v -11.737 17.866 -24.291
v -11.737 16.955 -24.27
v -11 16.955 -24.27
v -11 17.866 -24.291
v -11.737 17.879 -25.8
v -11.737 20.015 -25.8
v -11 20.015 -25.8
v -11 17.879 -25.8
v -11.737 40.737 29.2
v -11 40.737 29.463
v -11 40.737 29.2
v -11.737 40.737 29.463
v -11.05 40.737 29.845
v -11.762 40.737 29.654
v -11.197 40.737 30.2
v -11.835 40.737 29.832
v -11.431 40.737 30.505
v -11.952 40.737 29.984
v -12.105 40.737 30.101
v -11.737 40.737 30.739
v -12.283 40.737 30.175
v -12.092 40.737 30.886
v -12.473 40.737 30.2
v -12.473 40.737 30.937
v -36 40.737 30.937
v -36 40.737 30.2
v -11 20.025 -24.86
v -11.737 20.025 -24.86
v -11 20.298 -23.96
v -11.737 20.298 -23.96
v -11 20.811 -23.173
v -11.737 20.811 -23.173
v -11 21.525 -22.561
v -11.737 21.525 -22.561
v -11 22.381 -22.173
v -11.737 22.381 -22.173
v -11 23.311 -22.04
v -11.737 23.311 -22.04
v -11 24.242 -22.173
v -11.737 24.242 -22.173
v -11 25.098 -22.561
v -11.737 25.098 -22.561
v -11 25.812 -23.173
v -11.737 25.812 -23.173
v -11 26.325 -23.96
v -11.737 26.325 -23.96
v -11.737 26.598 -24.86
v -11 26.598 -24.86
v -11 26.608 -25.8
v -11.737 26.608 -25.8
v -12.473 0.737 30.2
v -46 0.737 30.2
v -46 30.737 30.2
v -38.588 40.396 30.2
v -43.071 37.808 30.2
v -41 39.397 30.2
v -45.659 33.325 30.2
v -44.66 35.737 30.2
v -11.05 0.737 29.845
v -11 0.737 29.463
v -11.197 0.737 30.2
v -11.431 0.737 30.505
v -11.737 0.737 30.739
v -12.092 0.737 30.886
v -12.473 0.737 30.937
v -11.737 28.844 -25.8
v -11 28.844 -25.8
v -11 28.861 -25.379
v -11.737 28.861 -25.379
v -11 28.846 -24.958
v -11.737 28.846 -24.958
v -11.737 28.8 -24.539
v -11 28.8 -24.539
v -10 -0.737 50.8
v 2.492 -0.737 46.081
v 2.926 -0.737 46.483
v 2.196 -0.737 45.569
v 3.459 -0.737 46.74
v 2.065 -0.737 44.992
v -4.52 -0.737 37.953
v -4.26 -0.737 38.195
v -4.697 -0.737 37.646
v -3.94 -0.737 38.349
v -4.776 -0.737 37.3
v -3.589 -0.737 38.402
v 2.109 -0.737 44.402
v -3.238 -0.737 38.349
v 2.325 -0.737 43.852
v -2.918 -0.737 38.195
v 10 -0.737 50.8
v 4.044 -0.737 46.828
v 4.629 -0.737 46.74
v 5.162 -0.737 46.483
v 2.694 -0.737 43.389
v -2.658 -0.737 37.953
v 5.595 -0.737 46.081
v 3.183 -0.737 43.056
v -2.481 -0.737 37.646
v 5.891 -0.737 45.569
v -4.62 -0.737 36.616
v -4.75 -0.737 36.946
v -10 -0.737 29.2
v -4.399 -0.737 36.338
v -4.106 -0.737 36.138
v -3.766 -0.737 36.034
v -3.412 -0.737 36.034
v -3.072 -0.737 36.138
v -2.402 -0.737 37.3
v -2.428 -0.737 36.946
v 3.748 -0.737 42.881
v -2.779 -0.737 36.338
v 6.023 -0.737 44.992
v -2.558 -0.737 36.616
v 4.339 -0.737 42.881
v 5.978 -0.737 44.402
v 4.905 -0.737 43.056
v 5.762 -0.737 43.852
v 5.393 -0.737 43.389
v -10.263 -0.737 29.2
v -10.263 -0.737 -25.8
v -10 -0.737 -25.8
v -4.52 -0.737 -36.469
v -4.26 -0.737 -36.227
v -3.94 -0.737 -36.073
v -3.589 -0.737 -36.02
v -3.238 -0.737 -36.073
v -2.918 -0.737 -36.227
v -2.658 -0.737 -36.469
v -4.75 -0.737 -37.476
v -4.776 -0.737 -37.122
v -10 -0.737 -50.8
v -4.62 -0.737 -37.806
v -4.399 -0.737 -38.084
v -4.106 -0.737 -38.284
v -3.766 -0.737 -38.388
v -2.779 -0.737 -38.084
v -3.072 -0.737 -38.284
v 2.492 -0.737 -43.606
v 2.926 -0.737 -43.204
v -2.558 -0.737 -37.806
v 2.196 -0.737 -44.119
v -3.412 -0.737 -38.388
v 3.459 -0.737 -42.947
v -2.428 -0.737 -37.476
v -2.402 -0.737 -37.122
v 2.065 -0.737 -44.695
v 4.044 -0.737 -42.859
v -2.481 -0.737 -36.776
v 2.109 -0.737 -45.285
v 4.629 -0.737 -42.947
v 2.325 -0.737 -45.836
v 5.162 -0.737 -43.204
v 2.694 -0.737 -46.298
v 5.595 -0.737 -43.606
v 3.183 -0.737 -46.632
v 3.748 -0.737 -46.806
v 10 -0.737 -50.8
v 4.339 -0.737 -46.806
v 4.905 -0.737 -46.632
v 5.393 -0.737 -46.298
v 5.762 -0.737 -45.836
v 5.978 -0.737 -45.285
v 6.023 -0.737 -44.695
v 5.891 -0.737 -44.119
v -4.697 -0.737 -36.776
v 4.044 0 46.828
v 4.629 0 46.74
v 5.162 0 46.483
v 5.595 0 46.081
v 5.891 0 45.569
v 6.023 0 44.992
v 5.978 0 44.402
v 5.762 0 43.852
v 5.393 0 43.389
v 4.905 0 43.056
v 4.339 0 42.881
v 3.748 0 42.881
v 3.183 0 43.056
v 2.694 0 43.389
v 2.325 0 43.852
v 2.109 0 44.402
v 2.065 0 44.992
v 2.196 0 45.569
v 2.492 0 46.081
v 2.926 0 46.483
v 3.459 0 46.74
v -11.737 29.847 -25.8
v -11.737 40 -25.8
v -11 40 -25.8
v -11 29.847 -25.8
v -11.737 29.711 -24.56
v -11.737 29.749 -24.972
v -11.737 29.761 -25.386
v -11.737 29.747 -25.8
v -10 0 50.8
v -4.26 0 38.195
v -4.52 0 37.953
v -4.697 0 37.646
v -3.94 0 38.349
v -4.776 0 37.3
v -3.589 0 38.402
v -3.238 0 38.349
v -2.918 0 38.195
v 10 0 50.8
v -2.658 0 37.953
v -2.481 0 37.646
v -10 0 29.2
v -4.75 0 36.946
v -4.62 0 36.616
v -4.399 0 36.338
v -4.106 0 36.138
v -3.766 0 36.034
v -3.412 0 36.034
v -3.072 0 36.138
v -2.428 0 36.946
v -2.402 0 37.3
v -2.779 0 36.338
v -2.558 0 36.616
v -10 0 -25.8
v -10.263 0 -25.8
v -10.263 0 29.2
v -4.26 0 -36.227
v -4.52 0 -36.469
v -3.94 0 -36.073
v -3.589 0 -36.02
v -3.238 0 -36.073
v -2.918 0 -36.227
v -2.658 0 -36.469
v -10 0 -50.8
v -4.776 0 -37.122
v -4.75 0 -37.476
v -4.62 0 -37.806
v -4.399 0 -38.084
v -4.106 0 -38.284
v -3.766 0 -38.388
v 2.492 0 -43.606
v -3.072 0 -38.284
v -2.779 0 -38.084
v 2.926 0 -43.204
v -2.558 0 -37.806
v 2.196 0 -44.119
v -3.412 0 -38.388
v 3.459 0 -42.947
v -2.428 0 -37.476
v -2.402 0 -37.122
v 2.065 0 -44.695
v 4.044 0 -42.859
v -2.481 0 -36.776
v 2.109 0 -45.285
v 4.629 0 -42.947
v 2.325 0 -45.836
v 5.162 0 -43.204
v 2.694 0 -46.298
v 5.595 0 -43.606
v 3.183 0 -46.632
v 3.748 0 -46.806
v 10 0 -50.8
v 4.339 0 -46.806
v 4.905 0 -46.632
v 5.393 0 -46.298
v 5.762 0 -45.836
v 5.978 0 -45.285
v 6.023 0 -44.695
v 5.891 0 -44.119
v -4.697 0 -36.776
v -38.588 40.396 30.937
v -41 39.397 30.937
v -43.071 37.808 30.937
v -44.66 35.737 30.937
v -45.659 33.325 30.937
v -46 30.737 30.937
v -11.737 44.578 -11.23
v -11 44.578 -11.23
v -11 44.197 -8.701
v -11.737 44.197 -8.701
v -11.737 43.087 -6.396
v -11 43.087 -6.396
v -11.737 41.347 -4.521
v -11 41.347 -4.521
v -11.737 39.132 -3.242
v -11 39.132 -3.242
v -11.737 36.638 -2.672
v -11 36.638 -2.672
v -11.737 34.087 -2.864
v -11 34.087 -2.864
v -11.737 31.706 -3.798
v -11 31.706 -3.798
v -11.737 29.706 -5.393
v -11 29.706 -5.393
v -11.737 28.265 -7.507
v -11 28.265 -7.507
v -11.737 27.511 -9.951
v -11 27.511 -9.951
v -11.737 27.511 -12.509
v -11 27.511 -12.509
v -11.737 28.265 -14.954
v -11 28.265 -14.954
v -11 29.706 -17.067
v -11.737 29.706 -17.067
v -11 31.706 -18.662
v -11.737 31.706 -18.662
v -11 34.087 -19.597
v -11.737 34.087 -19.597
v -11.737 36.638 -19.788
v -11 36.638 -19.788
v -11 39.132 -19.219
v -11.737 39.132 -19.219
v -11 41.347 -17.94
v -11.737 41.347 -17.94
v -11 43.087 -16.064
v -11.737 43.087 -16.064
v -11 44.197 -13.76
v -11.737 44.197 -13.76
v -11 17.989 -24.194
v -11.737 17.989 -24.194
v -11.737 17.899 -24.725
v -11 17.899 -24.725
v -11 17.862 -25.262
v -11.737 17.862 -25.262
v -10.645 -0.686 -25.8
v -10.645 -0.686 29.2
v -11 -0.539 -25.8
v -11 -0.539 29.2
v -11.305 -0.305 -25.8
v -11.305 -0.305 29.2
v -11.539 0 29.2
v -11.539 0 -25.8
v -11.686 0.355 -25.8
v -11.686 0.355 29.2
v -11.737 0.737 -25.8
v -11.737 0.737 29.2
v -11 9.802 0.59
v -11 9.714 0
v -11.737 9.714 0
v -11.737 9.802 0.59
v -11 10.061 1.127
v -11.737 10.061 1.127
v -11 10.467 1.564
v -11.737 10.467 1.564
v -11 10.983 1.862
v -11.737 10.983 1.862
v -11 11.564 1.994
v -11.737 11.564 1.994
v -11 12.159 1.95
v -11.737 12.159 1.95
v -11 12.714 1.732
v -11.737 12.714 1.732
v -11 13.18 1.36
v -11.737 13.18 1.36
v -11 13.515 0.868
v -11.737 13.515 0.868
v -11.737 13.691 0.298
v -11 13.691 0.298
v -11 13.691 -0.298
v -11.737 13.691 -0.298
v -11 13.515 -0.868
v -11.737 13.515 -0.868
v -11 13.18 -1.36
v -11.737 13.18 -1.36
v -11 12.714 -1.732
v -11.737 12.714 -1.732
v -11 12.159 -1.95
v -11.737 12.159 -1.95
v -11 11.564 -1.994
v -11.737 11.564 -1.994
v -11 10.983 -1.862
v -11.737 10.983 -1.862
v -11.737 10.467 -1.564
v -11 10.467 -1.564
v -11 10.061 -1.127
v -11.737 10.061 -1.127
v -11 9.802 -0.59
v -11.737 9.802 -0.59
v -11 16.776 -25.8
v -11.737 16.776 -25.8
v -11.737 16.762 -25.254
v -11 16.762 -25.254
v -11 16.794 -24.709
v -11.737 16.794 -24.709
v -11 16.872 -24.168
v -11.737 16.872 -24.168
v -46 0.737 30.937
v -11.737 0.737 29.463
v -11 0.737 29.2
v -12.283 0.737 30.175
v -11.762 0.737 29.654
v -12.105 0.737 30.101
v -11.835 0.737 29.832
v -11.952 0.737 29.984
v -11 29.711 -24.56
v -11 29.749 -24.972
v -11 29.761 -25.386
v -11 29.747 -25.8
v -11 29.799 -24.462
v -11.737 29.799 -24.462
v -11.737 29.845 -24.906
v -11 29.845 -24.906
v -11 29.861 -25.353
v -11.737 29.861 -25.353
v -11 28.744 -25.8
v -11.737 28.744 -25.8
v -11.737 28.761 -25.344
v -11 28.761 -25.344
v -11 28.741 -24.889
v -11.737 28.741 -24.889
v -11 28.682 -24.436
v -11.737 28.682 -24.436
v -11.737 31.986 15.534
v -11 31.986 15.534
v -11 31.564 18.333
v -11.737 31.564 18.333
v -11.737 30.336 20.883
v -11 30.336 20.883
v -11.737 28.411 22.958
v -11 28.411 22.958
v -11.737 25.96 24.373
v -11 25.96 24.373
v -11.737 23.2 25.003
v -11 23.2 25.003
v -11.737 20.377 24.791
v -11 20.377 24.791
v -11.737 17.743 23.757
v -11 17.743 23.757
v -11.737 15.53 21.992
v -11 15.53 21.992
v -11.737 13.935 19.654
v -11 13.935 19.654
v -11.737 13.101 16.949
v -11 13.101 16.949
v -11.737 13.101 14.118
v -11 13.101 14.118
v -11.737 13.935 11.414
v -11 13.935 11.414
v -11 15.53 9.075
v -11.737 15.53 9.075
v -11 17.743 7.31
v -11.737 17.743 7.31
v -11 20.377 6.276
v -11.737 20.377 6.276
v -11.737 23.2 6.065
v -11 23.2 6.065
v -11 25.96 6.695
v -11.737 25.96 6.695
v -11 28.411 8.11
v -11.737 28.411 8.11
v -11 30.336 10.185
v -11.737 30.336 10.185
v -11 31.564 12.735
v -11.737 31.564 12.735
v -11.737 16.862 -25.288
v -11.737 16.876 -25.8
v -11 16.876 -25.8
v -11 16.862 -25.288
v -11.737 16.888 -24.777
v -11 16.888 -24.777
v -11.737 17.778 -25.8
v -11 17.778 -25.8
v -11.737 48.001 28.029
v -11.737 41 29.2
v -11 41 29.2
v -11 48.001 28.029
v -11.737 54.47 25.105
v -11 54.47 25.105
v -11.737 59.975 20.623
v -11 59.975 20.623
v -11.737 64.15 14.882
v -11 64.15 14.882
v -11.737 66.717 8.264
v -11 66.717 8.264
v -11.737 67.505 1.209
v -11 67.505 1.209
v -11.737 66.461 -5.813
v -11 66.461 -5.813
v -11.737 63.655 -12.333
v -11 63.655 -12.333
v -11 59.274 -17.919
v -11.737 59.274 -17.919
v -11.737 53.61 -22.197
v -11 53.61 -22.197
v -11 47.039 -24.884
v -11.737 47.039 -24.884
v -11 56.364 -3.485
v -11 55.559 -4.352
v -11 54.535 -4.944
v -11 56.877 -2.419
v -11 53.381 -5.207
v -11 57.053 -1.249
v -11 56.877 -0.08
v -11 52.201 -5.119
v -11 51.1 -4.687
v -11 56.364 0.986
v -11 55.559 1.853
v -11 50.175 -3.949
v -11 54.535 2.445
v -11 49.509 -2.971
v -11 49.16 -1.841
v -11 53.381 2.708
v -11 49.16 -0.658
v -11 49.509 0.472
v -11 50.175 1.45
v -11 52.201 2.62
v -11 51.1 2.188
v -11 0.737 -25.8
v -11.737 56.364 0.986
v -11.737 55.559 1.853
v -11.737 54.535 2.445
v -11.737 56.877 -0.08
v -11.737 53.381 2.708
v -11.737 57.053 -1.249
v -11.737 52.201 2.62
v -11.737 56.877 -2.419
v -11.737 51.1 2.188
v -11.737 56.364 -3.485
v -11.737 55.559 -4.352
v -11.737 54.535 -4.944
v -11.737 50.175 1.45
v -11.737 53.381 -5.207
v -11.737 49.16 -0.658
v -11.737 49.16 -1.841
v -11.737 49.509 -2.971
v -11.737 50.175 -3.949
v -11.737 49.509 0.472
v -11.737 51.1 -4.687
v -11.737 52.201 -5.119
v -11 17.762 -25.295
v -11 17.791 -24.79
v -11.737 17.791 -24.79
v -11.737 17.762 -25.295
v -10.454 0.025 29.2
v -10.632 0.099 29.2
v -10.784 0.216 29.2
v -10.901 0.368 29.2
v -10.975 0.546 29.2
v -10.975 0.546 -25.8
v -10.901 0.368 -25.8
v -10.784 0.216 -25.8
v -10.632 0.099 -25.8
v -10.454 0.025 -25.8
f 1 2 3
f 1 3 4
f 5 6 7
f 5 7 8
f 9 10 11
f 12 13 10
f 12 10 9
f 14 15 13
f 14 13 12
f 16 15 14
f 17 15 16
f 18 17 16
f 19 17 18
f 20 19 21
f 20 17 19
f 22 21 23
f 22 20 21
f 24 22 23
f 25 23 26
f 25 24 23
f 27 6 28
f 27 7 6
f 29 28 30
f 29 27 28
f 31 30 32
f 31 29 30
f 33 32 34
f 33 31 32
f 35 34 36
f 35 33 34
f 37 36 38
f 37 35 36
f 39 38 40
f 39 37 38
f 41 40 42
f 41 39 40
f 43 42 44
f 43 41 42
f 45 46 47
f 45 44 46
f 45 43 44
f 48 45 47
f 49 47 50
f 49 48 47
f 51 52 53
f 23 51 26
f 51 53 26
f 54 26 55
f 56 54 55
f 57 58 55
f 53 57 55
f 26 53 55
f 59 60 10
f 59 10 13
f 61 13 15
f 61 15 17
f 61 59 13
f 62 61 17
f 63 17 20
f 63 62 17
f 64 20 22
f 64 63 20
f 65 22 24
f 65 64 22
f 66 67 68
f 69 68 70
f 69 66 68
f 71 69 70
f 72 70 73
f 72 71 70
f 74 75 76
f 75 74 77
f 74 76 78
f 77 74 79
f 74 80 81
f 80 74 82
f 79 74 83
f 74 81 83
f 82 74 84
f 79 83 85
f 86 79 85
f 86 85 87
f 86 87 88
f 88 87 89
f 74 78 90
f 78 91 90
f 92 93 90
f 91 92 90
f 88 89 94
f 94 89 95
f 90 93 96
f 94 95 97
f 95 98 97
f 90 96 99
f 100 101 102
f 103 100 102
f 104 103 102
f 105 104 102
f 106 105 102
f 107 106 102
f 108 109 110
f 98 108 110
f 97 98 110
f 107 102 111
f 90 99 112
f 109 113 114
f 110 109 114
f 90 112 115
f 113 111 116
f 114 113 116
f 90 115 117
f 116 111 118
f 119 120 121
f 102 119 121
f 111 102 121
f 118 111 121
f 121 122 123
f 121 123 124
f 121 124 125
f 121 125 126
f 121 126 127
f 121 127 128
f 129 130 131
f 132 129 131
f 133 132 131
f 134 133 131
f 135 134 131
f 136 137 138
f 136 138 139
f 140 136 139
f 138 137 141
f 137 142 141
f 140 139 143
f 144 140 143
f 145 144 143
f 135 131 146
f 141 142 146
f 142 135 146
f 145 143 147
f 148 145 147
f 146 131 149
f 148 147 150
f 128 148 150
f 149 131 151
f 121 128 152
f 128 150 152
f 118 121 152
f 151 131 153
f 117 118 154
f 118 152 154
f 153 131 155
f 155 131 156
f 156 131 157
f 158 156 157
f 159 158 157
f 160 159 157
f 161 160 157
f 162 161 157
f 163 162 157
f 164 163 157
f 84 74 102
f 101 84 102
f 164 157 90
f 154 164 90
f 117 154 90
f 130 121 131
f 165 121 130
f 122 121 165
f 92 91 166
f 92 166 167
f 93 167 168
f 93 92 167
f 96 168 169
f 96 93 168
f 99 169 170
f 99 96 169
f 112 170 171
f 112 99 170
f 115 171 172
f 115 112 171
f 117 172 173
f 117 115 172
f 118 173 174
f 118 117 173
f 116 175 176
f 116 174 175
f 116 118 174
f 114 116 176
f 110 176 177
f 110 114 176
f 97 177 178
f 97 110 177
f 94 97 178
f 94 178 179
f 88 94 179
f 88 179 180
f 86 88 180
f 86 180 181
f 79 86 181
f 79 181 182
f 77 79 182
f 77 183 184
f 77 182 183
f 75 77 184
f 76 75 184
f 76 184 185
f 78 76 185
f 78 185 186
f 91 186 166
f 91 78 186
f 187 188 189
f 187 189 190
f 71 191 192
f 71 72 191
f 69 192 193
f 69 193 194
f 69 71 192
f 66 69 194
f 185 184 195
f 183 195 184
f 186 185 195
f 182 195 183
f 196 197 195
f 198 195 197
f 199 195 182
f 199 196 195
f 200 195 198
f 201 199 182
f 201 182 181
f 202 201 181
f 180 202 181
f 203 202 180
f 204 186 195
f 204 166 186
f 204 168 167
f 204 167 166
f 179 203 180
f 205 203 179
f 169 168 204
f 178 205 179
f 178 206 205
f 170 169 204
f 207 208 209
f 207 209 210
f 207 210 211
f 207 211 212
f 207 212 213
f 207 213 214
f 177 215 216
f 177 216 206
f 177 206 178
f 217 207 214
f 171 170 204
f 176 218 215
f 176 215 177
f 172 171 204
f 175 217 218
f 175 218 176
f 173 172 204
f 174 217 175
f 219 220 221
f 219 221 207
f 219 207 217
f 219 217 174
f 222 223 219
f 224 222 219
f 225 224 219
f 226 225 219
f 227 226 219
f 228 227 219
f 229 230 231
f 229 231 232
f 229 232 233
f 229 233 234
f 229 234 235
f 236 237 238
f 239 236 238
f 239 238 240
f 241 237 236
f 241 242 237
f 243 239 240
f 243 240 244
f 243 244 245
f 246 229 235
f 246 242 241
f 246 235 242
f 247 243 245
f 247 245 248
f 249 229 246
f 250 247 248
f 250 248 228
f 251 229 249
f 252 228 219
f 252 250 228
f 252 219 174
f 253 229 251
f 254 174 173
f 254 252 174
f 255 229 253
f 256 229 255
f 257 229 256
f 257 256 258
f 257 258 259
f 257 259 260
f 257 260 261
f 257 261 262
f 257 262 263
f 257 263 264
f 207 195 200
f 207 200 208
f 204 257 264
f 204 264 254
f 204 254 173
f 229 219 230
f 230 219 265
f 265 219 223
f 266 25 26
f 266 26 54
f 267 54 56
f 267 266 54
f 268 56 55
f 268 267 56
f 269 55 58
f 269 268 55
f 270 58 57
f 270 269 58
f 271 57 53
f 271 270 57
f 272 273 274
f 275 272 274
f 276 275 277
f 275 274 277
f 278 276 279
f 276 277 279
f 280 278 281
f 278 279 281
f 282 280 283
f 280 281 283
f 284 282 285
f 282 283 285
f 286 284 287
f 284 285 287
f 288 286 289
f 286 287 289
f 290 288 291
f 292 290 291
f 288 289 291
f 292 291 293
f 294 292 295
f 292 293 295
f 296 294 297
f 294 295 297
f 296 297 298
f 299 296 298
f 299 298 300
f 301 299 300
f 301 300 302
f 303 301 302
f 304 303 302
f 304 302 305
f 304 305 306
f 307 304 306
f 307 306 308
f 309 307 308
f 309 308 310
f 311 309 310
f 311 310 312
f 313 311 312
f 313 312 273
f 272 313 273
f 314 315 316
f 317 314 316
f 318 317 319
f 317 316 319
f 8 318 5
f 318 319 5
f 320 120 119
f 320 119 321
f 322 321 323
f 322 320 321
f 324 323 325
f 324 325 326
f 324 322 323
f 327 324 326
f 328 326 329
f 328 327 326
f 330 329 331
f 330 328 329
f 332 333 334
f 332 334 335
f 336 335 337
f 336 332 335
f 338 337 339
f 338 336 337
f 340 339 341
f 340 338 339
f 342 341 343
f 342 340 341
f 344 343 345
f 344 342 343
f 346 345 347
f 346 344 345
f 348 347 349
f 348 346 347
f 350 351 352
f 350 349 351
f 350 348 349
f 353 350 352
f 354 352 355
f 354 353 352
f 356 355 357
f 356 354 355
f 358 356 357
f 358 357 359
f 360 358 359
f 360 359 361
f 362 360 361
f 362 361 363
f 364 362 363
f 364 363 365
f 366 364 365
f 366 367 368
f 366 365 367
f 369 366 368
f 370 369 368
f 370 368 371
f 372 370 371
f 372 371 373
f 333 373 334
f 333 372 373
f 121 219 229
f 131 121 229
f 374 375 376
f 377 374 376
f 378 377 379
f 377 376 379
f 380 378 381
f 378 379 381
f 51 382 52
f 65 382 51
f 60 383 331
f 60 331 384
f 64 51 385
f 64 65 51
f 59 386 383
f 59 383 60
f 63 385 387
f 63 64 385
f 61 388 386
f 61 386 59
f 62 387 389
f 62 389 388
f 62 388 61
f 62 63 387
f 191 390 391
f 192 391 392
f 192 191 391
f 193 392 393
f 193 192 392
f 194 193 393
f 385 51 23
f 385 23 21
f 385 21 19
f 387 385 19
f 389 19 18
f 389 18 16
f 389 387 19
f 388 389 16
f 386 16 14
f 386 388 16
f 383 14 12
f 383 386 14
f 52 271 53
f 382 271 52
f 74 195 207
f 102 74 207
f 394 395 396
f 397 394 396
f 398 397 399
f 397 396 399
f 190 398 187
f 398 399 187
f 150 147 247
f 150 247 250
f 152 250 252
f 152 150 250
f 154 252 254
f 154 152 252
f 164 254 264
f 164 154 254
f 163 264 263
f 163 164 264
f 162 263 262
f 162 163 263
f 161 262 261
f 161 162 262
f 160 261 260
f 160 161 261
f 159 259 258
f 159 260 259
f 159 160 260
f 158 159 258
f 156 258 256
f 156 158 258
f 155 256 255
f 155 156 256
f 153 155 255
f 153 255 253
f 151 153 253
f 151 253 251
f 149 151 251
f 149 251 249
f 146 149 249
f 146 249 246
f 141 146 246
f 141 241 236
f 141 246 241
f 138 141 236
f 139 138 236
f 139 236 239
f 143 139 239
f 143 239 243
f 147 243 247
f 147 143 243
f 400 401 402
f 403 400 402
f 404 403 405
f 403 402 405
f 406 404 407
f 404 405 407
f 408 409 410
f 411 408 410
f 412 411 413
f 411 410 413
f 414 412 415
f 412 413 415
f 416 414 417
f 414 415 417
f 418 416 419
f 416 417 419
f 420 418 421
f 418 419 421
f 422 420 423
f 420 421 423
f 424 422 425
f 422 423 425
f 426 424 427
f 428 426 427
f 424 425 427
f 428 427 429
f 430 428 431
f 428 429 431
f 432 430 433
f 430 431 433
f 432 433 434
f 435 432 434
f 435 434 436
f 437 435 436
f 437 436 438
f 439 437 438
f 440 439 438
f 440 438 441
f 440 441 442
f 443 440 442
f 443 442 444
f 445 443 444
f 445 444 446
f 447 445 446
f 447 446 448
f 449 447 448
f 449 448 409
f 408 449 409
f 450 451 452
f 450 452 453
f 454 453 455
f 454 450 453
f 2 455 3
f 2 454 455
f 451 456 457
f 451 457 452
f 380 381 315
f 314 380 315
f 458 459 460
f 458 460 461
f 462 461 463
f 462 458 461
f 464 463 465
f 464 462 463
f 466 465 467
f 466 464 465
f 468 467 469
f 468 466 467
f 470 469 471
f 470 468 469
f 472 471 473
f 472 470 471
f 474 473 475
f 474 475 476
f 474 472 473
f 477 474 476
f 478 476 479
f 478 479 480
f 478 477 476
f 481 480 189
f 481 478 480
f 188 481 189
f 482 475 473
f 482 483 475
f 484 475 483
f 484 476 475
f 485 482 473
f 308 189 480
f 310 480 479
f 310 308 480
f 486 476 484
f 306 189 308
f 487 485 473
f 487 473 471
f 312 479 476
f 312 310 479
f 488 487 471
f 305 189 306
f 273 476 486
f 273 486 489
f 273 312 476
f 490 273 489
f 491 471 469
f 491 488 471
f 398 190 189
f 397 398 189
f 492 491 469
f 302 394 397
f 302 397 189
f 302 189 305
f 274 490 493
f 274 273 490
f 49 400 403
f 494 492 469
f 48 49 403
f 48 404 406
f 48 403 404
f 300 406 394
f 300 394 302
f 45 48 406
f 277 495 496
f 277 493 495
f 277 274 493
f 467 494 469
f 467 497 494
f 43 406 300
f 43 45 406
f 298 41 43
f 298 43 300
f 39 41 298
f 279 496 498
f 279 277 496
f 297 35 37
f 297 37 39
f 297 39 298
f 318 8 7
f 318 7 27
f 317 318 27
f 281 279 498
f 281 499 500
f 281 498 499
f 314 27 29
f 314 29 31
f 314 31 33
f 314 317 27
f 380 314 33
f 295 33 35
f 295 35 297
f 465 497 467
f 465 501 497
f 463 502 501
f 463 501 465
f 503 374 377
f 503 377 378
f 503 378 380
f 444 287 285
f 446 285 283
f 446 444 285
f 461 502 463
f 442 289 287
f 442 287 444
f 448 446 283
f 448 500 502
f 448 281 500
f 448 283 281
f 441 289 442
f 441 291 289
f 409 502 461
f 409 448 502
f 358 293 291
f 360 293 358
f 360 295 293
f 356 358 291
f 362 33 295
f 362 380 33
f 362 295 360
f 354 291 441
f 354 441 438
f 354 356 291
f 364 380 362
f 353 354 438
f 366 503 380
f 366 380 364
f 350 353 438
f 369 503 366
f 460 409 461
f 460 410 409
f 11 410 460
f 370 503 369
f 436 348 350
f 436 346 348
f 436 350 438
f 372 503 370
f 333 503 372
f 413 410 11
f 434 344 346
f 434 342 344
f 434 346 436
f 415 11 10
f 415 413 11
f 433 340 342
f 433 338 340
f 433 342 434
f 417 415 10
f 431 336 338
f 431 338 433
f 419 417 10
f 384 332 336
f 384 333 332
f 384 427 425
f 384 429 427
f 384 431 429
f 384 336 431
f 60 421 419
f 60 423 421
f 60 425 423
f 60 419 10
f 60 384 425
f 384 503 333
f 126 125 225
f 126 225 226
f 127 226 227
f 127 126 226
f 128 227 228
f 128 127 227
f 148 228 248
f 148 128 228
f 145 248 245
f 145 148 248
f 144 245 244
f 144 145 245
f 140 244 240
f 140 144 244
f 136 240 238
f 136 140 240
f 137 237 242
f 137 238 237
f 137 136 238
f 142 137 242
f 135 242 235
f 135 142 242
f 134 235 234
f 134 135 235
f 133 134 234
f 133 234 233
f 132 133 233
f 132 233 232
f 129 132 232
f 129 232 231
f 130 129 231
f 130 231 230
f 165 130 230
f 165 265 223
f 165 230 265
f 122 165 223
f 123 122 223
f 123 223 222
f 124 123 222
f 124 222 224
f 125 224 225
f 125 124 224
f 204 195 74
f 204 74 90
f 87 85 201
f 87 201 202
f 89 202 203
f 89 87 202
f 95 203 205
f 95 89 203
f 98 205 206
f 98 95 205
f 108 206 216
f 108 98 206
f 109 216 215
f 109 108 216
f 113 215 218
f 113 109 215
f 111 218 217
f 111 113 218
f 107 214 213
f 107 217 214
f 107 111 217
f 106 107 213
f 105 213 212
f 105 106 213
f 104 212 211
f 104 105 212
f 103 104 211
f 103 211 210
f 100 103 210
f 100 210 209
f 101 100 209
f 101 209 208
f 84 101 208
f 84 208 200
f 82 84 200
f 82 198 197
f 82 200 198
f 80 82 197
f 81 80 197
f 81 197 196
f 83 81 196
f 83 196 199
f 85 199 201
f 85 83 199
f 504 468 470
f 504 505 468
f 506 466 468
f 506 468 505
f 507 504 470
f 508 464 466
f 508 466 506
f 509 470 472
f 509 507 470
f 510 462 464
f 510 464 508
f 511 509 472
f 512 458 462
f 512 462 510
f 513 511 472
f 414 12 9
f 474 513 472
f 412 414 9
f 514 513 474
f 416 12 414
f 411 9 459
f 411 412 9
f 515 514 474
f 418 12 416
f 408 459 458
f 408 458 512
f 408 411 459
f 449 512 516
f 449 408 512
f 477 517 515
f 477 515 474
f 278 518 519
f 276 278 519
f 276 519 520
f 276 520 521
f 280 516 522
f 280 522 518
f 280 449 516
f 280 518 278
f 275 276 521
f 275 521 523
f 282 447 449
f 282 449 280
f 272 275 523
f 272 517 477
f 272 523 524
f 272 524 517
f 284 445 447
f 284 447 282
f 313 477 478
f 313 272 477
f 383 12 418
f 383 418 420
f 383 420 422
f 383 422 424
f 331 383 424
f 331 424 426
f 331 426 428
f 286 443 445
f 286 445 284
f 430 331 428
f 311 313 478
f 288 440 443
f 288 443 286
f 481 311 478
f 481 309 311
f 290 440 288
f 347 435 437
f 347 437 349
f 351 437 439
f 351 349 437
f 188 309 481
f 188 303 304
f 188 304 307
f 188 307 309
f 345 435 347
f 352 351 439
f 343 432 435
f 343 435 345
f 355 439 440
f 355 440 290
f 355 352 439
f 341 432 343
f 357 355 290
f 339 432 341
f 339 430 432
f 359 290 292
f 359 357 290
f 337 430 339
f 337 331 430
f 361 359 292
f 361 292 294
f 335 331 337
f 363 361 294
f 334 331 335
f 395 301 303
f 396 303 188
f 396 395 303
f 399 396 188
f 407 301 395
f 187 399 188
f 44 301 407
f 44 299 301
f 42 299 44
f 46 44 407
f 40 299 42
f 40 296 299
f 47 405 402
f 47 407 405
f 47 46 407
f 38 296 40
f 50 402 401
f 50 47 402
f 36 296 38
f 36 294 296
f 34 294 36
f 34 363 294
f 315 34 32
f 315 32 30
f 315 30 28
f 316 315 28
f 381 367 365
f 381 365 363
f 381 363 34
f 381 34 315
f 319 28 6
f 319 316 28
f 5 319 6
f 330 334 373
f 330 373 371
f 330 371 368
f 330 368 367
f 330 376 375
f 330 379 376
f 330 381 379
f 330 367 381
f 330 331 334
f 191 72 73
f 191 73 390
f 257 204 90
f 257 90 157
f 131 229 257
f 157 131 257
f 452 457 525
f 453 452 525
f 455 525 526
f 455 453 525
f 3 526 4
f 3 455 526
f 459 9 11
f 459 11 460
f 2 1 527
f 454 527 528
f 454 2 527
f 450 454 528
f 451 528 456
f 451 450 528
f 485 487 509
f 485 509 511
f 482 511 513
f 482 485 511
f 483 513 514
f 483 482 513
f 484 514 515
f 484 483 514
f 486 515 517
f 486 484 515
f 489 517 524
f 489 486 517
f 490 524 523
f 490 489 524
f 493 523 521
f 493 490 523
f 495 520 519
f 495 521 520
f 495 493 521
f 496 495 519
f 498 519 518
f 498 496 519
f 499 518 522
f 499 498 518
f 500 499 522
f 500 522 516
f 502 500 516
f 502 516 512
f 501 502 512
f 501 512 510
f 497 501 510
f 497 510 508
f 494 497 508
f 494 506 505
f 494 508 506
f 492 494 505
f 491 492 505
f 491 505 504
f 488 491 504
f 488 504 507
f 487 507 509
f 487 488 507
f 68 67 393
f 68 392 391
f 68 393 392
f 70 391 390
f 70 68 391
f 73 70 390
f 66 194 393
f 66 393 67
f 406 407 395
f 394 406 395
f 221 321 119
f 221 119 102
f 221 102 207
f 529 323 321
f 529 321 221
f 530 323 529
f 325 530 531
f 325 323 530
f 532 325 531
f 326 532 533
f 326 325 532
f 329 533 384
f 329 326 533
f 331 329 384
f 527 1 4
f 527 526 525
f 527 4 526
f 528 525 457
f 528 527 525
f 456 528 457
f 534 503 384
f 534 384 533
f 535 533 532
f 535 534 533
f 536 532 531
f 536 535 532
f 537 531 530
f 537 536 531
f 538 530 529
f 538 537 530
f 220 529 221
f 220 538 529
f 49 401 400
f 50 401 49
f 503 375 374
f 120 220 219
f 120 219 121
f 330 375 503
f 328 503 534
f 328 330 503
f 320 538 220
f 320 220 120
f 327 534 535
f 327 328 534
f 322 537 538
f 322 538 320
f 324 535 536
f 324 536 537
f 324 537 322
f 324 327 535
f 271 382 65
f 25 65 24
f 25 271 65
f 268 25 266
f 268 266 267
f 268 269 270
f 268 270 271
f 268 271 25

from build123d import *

# Parameters (mm, degrees)
SKETCH1_W                = 20
SKETCH1_H                = 101.6
BASE_FLANGE1_DEPTH       = 0.7366
EDGE_FLANGE1_DEPTH       = 55
EDGE_FLANGE1_START       = 0.7366
EDGE_FLANGE1_FLAT_DEPTH  = 0.7366
EDGE_FLANGE2_DEPTH       = 40
EDGE_FLANGE2_START       = 0.7366
EDGE_FLANGE2_FLAT_DEPTH  = 0.7366
CUT_EXTRUDE47_DEPTH      = 230.052185051
CUT_EXTRUDE48_DEPTH      = 229.903278335
CUT_EXTRUDE48_DEPTH_BACK = 229.903278335
SKETCH71_R               = 3.96875
CUT_EXTRUDE49_DEPTH      = 230.052185051
CUT_EXTRUDE49_DEPTH_BACK = 230.052185051
SKETCH72_R               = 3.325000001
CUT_EXTRUDE51_DEPTH      = 238.760289891
CUT_EXTRUDE51_DEPTH_BACK = 238.760289891
SKETCH74_R               = 2
CUT_EXTRUDE52_DEPTH      = 257.408459939
CUT_EXTRUDE52_DEPTH_BACK = 257.408459939
SKETCH75_R               = 1.984375
SKETCH75_R_2             = 1.190625
SKETCH101_R              = 9.495541857
SKETCH101_R_2            = 8.581709401
CUT_EXTRUDE56_DEPTH      = 20


# Sheet-metal steps are written as plain solids
with BuildPart() as part:
    # Sketch1 → Base-Flange1 (new body)
    with BuildSketch(Plane(origin=(0, 0, 0), x_dir=(1, 0, 0), z_dir=(0, 1, 0))):
        Rectangle(SKETCH1_W, SKETCH1_H)
    extrude(amount=-BASE_FLANGE1_DEPTH)

    # Edge-Flange1 bend section (across the edge) → Edge-Flange1 (add)
    with BuildSketch(Plane(origin=(-11, 0, -25.8), x_dir=(1, 0, 0), z_dir=(0, 0, 1))):
        with BuildLine():
            Line((-0.7366, 0.7366), (0, 0.7366))
            ThreePointArc((0, 0.7366), (0.215745145, 0.215745145), (0.7366, 0))
            Line((0.7366, 0), (1, 0))
            Line((1, 0), (1, -0.7366))
            Line((1, -0.7366), (0.7366, -0.7366))
            ThreePointArc((0.7366, -0.7366), (-0.30510971, -0.30510971), (-0.7366, 0.7366))
        make_face()
    extrude(amount=EDGE_FLANGE1_DEPTH)

    # Edge-Flange1 profile (on flange) → Edge-Flange1 flat (add)
    with BuildSketch(Plane.ZY.offset(11).offset(EDGE_FLANGE1_START)):
        with BuildLine():
            ThreePointArc((29.2, 41), (1.209008271, 67.504545079), (-25.8, 40))
            Line((-25.8, 40), (-25.8, 0.7366))
            Line((-25.8, 0.7366), (29.2, 0.7366))
            Line((29.2, 0.7366), (29.2, 41))
        make_face()
    extrude(amount=-EDGE_FLANGE1_FLAT_DEPTH)

    # Edge-Flange2 bend section (across the edge) → Edge-Flange2 (add)
    with BuildSketch(Plane(origin=(-11.7366, 0.7366, 30.2), x_dir=(0, 0, -1), z_dir=(0, 1, 0))):
        with BuildLine():
            Line((-0.7366, 0.7366), (0, 0.7366))
            ThreePointArc((0, 0.7366), (0.215745145, 0.215745145), (0.7366, 0))
            Line((0.7366, 0), (1, 0))
            Line((1, 0), (1, -0.7366))
            Line((1, -0.7366), (0.7366, -0.7366))
            ThreePointArc((0.7366, -0.7366), (-0.30510971, -0.30510971), (-0.7366, 0.7366))
        make_face()
    extrude(amount=EDGE_FLANGE2_DEPTH)

    # Edge-Flange2 profile (on flange) → Edge-Flange2 flat (add)
    with BuildSketch(Plane(origin=(-11.7366, 0, 30.2), x_dir=(0, 1, 0), z_dir=(0, 0, 1)).offset(EDGE_FLANGE2_START)):
        with BuildLine():
            Line((0.7366, 34.2634), (0.7366, 0.7366))
            Line((0.7366, 0.7366), (40.7366, 0.7366))
            Line((40.7366, 0.7366), (40.7366, 24.2634))
            ThreePointArc((40.7366, 24.2634), (37.807667812, 31.334467812), (30.7366, 34.2634))
            Line((30.7366, 34.2634), (0.7366, 34.2634))
        make_face()
    extrude(amount=-EDGE_FLANGE2_FLAT_DEPTH)

    # Sketch64 → Cut-Extrude47 (cut, through all)
    # profile 1 of 2: a face of its own
    with BuildSketch(Plane(origin=(-11.7366, -124.793980752, -68.826299478), x_dir=(0, 0, 1), z_dir=(-1, 0, 0))):
        with BuildLine():
            Line((42.264984419, 154.545155362), (42.290366731, 153.42804852))
            ThreePointArc((42.290366731, 153.42804852), (43.337776459, 153.553976781), (44.389824862, 153.475751299))
            Line((44.389824862, 153.475751299), (44.36444255, 154.592858142))
            ThreePointArc((44.36444255, 154.592858142), (43.312789289, 154.653692945), (42.264984419, 154.545155362))
        make_face()
        with BuildLine():
            Line((42.366903907, 154.461812233), (42.387610682, 153.55048153))
            ThreePointArc((42.387610682, 153.55048153), (43.335504899, 153.653950977), (44.28712042, 153.593641187))
            Line((44.28712042, 153.593641187), (44.266413645, 154.504971891))
            ThreePointArc((44.266413645, 154.504971891), (43.31506085, 154.553718748), (42.366903907, 154.461812233))
        make_face(mode=Mode.SUBTRACT)
    # profile 2 of 2: a face of its own
    with BuildSketch(Plane(origin=(-11.7366, -124.793980752, -68.826299478), x_dir=(0, 0, 1), z_dir=(-1, 0, 0))):
        with BuildLine():
            Line((44.65816864, 141.665610755), (44.632786328, 142.782717598))
            ThreePointArc((44.632786328, 142.782717598), (43.585376599, 142.656789337), (42.533328197, 142.735014819))
            Line((42.533328197, 142.735014819), (42.558710509, 141.617907976))
            ThreePointArc((42.558710509, 141.617907976), (43.610363769, 141.557073173), (44.65816864, 141.665610755))
        make_face()
        with BuildLine():
            Line((44.556249151, 141.748953884), (44.535542376, 142.660284588))
            ThreePointArc((44.535542376, 142.660284588), (43.58764816, 142.556815141), (42.636032639, 142.617124931))
            Line((42.636032639, 142.617124931), (42.656739414, 141.705794227))
            ThreePointArc((42.656739414, 141.705794227), (43.608092208, 141.65704737), (44.556249151, 141.748953884))
        make_face(mode=Mode.SUBTRACT)
    extrude(amount=-CUT_EXTRUDE47_DEPTH, mode=Mode.SUBTRACT)


with BuildPart() as cut_extrude47_piece_1:
    # of the separate pieces the step leaves, piece 1, a body of its own (cut_extrude47_pieces)
    add(part.part.solids().sort_by_distance((-10, 0, -50.8))[0])

    # Sketch71 → Cut-Extrude48 (cut, two sides: drawn at the far end of the back side and taken through both)
    with BuildSketch(Plane(origin=(-23.253389833, -124.793980752, -68.826299478), x_dir=(0, 0, 1), z_dir=(-1, 0, 0)).offset(-CUT_EXTRUDE48_DEPTH_BACK)):
        with Locations(Location((67.576820433, 177.878571709, 0), (0, 0, 90))):
            Circle(SKETCH71_R)
    extrude(amount=CUT_EXTRUDE48_DEPTH + CUT_EXTRUDE48_DEPTH_BACK, mode=Mode.SUBTRACT)

    # Sketch72 → Cut-Extrude49 (cut, two sides: drawn at the far end of the back side and taken through both)
    with BuildSketch(Plane(origin=(-11.7366, -124.793980752, -68.826299478), x_dir=(0, 0, 1), z_dir=(-1, 0, 0)).offset(-CUT_EXTRUDE49_DEPTH_BACK)):
        with Locations((43.461576529, 148.105383059)):
            Circle(SKETCH72_R)
    extrude(amount=CUT_EXTRUDE49_DEPTH + CUT_EXTRUDE49_DEPTH_BACK, mode=Mode.SUBTRACT)

    # Sketch74 → Cut-Extrude51 (cut, two sides: drawn at the far end of the back side and taken through both)
    with BuildSketch(Plane(origin=(-62.381161581, -124.793980752, -68.826299478), x_dir=(0, 0, 1), z_dir=(-1, 0, 0)).offset(-CUT_EXTRUDE51_DEPTH_BACK)):
        with Locations(Location((68.826299478, 136.507533033, 0), (0, 0, 270))):
            Circle(SKETCH74_R)
    extrude(amount=CUT_EXTRUDE51_DEPTH + CUT_EXTRUDE51_DEPTH_BACK, mode=Mode.SUBTRACT)

    # Sketch75 → Cut-Extrude52 (cut, two sides: drawn at the far end of the back side and taken through both)
    with BuildSketch(Plane(origin=(-206.511822879, 0, -68.826299478), x_dir=(0.7071067811865436, 0, -0.7071067811865515), z_dir=(0, 1, 0)).offset(-CUT_EXTRUDE52_DEPTH_BACK)):
        with Locations(Location((68.508410595, -229.262065492, 0), (0, 0, 225))):
            Circle(SKETCH75_R)
        with Locations(Location((68.508410595, -218.467797635, 0), (0, 0, 225))):
            Circle(SKETCH75_R_2)
        with Locations(Location((131.926979322, -165.843496765, 0), (0, 0, 225))):
            Circle(SKETCH75_R)
        with Locations(Location((121.132711465, -165.843496765, 0), (0, 0, 225))):
            Circle(SKETCH75_R_2)
    extrude(amount=CUT_EXTRUDE52_DEPTH + CUT_EXTRUDE52_DEPTH_BACK, mode=Mode.SUBTRACT)

    # Sketch101 → Cut-Extrude56 (cut)
    with BuildSketch(Plane(origin=(-11, 0, 0), x_dir=(0, 0, -1), z_dir=(1, 0, 0))):
        with Locations(Location((-15.533658022, 22.490432719, 0), (0, 0, 90))):
            Circle(SKETCH101_R)
        with Locations(Location((11.230113003, 35.996614342, 0), (0, 0, 90))):
            Circle(SKETCH101_R_2)
    extrude(amount=-CUT_EXTRUDE56_DEPTH, mode=Mode.SUBTRACT)


with BuildPart() as cut_extrude47_piece_2:
    # of the separate pieces the step leaves, piece 2, a body of its own (cut_extrude47_pieces)
    add(part.part.solids().sort_by_distance((-11, 16.876106363, -25.8))[0])


with BuildPart() as cut_extrude47_piece_3:
    # of the separate pieces the step leaves, piece 3, a body of its own (cut_extrude47_pieces)
    add(part.part.solids().sort_by_distance((-11, 29.710991139, -24.559885833))[0])


solid = Compound([cut_extrude47_piece_1.part, cut_extrude47_piece_2.part, cut_extrude47_piece_3.part])
